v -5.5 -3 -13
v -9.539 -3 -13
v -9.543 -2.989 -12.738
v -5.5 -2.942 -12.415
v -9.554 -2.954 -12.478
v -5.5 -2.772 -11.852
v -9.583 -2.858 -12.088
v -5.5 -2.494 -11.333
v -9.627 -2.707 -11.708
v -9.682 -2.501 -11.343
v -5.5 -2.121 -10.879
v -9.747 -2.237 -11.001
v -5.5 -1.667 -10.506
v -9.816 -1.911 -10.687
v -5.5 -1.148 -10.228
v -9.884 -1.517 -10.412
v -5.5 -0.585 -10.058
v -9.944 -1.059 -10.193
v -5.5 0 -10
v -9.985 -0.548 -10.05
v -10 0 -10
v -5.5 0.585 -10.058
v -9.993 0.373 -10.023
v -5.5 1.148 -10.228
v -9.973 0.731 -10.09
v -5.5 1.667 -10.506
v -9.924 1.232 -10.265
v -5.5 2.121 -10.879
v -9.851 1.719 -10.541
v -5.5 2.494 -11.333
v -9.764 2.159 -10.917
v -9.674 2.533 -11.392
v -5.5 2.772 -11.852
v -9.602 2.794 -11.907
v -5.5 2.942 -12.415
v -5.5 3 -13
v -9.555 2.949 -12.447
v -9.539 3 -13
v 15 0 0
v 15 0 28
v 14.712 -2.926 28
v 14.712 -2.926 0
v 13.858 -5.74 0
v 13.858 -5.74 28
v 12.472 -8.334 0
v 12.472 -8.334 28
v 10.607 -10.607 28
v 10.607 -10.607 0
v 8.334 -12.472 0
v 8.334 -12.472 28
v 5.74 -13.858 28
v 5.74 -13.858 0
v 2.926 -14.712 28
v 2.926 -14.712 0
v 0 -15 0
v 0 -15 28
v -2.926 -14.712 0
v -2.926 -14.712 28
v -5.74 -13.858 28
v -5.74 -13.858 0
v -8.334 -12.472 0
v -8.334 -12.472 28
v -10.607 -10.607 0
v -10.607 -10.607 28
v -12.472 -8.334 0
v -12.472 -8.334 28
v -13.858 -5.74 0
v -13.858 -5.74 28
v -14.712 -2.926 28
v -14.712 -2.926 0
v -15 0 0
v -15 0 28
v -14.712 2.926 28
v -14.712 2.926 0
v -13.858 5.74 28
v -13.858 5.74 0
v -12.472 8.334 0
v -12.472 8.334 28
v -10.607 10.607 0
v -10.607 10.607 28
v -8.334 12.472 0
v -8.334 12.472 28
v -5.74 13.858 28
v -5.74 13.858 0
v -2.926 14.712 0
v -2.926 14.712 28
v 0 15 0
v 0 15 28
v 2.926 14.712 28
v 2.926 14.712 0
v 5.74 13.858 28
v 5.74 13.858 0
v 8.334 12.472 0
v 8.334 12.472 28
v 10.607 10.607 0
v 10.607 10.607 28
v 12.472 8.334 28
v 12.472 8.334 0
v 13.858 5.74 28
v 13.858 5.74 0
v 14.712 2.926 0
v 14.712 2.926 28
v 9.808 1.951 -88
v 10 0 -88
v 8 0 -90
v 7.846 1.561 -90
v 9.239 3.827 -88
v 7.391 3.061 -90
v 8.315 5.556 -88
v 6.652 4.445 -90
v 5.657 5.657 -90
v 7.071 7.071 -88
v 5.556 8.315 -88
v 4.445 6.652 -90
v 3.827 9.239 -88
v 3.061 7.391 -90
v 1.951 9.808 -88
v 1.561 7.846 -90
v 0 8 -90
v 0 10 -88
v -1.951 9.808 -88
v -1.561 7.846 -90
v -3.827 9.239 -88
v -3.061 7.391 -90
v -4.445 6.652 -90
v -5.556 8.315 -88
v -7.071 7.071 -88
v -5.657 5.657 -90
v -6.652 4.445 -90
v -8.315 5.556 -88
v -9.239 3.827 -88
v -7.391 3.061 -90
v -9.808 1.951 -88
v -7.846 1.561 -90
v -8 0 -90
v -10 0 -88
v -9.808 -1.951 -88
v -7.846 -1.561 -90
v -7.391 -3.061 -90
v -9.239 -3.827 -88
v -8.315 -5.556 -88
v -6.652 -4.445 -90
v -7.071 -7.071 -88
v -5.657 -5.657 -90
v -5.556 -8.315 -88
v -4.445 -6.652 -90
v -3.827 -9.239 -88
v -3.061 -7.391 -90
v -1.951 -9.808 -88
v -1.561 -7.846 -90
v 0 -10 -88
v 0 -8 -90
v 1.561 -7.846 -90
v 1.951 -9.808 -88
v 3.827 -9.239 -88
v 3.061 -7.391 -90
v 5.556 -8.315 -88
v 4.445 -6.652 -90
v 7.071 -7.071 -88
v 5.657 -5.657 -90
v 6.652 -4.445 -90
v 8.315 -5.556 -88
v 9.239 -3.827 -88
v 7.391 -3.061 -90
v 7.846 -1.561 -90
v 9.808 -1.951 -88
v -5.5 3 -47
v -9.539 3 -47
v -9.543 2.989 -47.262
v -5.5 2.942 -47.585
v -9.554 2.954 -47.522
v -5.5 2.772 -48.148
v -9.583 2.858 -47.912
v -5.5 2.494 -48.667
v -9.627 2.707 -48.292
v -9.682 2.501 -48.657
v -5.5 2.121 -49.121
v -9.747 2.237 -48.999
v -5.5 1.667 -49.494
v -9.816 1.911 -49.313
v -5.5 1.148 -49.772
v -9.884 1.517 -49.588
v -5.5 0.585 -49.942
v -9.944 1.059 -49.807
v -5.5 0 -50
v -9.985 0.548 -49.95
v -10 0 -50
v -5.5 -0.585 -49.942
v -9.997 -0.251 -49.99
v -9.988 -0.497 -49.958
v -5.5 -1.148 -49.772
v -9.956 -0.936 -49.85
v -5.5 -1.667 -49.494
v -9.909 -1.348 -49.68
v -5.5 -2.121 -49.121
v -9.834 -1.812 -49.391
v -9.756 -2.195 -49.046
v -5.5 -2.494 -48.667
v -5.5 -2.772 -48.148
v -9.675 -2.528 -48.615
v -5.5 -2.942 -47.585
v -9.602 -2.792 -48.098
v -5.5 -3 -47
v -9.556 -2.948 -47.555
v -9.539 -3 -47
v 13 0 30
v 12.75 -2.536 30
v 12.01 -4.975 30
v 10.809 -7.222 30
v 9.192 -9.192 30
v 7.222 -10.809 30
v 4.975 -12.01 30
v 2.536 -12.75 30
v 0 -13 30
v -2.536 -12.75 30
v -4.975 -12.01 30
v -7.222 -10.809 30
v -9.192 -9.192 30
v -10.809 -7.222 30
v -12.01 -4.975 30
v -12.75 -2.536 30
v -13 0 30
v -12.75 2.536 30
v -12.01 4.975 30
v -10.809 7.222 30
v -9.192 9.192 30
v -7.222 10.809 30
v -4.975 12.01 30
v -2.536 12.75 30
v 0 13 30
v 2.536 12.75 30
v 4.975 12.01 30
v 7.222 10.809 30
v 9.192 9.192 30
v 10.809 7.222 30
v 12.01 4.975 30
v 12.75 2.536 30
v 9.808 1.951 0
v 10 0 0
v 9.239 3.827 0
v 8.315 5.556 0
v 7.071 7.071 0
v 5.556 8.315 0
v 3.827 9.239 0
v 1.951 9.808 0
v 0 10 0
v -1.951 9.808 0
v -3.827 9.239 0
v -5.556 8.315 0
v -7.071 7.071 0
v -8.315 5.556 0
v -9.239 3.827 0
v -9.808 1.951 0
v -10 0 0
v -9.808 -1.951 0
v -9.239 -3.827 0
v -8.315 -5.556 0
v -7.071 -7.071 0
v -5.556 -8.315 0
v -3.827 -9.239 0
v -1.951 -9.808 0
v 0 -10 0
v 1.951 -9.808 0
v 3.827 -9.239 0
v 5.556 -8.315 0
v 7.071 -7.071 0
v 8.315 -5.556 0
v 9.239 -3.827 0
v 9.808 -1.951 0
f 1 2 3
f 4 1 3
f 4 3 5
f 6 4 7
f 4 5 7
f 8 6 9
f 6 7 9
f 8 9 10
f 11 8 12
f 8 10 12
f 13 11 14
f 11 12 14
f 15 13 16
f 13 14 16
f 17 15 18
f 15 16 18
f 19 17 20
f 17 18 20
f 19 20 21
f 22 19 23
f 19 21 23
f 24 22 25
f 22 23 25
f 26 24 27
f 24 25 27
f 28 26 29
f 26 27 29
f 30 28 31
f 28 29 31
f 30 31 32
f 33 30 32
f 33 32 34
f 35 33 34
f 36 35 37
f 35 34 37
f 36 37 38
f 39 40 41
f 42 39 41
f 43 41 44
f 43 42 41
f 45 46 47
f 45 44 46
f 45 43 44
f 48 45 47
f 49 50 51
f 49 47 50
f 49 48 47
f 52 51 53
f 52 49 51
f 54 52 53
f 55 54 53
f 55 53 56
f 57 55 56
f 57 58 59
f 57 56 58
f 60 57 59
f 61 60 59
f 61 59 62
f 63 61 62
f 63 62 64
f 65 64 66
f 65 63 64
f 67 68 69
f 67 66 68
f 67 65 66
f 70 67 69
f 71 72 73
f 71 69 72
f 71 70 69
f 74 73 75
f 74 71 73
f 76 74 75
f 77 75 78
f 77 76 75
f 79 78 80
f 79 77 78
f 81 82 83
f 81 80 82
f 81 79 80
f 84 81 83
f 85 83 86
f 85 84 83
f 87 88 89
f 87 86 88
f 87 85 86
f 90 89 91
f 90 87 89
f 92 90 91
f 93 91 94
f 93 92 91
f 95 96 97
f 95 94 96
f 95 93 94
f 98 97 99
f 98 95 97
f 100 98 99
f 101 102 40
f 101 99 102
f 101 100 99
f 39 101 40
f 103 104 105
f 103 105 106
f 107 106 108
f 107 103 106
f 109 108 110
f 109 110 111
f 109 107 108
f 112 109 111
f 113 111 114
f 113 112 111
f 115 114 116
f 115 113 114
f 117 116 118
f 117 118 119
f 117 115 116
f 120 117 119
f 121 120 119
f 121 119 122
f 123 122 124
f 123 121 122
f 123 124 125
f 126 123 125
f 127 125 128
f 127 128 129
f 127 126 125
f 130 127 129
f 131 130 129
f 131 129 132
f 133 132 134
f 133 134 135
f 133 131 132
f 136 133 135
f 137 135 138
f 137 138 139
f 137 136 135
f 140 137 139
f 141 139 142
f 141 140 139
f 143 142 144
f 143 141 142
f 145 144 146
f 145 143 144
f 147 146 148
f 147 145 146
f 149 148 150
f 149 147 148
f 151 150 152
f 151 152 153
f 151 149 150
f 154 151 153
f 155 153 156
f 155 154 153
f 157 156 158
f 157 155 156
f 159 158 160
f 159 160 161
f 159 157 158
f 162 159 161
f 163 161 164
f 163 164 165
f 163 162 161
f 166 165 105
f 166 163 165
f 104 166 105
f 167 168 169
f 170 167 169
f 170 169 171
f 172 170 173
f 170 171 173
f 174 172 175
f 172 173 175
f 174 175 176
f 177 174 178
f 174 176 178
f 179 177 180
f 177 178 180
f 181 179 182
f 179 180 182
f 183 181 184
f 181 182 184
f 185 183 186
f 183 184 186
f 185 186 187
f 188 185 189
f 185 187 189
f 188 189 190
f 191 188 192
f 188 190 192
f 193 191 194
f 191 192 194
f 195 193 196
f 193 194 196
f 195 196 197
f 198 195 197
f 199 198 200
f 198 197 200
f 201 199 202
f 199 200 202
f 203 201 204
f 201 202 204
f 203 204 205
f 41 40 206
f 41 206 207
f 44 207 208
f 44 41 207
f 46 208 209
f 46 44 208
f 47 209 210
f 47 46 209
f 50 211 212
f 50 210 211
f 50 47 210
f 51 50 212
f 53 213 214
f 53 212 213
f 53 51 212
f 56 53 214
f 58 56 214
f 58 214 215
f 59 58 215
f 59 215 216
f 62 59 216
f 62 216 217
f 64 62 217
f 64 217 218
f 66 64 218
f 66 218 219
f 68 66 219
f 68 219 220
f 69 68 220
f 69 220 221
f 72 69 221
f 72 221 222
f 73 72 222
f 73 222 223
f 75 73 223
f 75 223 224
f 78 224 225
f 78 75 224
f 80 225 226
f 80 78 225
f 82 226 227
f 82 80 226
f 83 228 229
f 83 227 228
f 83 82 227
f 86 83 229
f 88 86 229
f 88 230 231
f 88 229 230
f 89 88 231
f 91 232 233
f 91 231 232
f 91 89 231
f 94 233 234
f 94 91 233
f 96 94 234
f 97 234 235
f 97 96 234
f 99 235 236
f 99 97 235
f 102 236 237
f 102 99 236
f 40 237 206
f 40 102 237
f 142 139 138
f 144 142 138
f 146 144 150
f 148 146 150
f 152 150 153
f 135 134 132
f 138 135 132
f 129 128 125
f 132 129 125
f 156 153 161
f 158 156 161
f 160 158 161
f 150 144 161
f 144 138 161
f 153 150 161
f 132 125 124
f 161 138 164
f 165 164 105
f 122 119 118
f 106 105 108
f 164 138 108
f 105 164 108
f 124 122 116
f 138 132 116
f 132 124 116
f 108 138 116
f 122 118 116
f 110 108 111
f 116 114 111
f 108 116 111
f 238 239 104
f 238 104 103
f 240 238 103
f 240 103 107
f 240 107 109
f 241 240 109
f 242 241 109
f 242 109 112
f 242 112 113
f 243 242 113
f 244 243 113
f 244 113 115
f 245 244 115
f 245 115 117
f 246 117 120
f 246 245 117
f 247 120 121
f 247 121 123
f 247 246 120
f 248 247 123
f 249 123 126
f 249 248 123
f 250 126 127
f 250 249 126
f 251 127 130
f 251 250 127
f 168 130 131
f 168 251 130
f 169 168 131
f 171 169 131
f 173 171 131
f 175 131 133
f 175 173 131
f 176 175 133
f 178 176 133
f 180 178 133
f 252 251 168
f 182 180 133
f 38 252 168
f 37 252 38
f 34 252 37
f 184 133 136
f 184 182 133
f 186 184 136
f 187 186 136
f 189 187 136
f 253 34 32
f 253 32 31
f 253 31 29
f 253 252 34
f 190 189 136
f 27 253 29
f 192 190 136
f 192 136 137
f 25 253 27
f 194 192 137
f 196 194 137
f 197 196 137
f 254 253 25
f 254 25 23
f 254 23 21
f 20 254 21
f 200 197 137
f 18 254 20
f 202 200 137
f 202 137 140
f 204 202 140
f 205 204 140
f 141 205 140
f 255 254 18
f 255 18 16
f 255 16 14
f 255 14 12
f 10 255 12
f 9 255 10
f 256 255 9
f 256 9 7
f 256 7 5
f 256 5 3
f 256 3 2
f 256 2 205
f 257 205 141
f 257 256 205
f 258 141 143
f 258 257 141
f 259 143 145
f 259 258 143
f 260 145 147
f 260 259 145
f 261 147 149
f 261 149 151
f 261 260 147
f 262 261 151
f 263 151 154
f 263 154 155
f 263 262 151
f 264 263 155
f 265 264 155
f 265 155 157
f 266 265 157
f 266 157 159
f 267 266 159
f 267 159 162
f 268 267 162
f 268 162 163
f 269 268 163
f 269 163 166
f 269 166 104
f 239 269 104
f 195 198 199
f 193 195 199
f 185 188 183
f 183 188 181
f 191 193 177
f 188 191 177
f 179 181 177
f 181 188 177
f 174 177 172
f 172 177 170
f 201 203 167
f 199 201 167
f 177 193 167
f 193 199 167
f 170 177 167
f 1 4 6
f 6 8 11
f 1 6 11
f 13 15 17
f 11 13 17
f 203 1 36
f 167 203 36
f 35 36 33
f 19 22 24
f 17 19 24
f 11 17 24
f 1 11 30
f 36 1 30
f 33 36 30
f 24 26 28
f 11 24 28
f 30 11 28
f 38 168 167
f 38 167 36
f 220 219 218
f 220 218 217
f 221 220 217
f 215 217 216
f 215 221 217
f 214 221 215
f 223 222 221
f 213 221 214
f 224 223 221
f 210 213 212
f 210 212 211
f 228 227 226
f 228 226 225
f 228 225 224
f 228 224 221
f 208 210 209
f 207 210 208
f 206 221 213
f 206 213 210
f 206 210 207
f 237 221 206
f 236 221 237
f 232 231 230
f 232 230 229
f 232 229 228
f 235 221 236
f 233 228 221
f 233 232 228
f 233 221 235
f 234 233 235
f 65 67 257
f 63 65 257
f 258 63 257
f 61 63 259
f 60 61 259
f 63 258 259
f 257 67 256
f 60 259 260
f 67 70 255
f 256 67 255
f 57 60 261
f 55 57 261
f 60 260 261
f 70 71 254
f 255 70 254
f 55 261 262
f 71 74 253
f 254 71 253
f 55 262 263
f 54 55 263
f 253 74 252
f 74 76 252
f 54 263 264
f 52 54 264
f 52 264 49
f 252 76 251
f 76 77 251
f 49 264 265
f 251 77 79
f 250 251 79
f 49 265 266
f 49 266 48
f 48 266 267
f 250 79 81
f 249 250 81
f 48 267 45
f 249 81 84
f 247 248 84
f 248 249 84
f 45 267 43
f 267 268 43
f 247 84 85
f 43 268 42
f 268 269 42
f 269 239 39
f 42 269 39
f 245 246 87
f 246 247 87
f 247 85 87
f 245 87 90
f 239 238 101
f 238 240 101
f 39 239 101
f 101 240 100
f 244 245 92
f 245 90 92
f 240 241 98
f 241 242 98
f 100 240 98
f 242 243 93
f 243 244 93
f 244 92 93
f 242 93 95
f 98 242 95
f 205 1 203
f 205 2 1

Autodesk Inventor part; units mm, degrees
ref_plane "YZ Plane" through (0, 0, 0) normal (1, 0, 0) x (0, 1, 0)
ref_plane "XZ Plane" through (0, 0, 0) normal (0, 1, 0) x (-1, 0, 0)
ref_plane "XY Plane" through (0, 0, 0) normal (0, 0, 1) x (1, 0, 0)
ref_plane "РабПлоскость1" through (0, 0, 0) normal (0, 0, 1) x (1, 0, 0)
sketch "Эскиз1" plane through (0, 0, 0) normal (0, 0, 1) x (1, 0, 0)
  circle A0 centre (0, 0) radius 10
  dimension "d0" = 20
extrude "Выдавливание1" add sketch "Эскиз1" against normal blind 90
sketch "Эскиз2" plane through (0, 0, 0) normal (0, 0, 1) x (1, 0, 0)
  circle A0 centre (0, 0) radius 15
  dimension "d3" = 30
extrude "Выдавливание2" add sketch "Эскиз2" along normal blind 30
chamfer "Фаска1" distance 2 angle 45 2 edges at (-15, 0, 30) (-10, 0, -90)
ref_plane "РабПлоскость2" through (-11.5, 3, -60) normal (1, 0, 0) x (0, 1, 0)
sketch "Эскиз3" plane through (-11.5, 3, -60) normal (1, 0, 0) x (0, 1, 0)
  line L0 (-18, 60) -> (12, 60) projected
  line L1 (12, 88) -> (-18, 88) projected
  line L2 (-13, 60) -> (7, 60) projected
  line L3 (-13, -28) -> (7, -28) projected
  line L4 (-3, 10) -> (-3, 10)
  line L5 (0, 13) -> (0, 47)
  line L6 (-3, 50) -> (-3, 50)
  line L7 (-6, 47) -> (-6, 13)
  line L8 (-6, 10) -> (0, 50) construction
  line L9 (0, 10) -> (-6, 50) construction
  arc A0 (0, 47) -> (-3, 50) centre (-3, 47) ccw
  arc A1 (-3, 50) -> (-6, 47) centre (-3, 47) ccw
  arc A2 (-3, 10) -> (0, 13) centre (-3, 13) ccw
  arc A3 (-6, 13) -> (-3, 10) centre (-3, 13) ccw
  point P0 (-3, 60)
  point P1 (-3, 30)
  dimension "d9" = 30
  dimension "d10" = 6
  dimension "d11" = 40
  dimension "d12" = 3
extrude "Выдавливание3" cut sketch "Эскиз3" along normal blind 6
properties part number "Ось"
